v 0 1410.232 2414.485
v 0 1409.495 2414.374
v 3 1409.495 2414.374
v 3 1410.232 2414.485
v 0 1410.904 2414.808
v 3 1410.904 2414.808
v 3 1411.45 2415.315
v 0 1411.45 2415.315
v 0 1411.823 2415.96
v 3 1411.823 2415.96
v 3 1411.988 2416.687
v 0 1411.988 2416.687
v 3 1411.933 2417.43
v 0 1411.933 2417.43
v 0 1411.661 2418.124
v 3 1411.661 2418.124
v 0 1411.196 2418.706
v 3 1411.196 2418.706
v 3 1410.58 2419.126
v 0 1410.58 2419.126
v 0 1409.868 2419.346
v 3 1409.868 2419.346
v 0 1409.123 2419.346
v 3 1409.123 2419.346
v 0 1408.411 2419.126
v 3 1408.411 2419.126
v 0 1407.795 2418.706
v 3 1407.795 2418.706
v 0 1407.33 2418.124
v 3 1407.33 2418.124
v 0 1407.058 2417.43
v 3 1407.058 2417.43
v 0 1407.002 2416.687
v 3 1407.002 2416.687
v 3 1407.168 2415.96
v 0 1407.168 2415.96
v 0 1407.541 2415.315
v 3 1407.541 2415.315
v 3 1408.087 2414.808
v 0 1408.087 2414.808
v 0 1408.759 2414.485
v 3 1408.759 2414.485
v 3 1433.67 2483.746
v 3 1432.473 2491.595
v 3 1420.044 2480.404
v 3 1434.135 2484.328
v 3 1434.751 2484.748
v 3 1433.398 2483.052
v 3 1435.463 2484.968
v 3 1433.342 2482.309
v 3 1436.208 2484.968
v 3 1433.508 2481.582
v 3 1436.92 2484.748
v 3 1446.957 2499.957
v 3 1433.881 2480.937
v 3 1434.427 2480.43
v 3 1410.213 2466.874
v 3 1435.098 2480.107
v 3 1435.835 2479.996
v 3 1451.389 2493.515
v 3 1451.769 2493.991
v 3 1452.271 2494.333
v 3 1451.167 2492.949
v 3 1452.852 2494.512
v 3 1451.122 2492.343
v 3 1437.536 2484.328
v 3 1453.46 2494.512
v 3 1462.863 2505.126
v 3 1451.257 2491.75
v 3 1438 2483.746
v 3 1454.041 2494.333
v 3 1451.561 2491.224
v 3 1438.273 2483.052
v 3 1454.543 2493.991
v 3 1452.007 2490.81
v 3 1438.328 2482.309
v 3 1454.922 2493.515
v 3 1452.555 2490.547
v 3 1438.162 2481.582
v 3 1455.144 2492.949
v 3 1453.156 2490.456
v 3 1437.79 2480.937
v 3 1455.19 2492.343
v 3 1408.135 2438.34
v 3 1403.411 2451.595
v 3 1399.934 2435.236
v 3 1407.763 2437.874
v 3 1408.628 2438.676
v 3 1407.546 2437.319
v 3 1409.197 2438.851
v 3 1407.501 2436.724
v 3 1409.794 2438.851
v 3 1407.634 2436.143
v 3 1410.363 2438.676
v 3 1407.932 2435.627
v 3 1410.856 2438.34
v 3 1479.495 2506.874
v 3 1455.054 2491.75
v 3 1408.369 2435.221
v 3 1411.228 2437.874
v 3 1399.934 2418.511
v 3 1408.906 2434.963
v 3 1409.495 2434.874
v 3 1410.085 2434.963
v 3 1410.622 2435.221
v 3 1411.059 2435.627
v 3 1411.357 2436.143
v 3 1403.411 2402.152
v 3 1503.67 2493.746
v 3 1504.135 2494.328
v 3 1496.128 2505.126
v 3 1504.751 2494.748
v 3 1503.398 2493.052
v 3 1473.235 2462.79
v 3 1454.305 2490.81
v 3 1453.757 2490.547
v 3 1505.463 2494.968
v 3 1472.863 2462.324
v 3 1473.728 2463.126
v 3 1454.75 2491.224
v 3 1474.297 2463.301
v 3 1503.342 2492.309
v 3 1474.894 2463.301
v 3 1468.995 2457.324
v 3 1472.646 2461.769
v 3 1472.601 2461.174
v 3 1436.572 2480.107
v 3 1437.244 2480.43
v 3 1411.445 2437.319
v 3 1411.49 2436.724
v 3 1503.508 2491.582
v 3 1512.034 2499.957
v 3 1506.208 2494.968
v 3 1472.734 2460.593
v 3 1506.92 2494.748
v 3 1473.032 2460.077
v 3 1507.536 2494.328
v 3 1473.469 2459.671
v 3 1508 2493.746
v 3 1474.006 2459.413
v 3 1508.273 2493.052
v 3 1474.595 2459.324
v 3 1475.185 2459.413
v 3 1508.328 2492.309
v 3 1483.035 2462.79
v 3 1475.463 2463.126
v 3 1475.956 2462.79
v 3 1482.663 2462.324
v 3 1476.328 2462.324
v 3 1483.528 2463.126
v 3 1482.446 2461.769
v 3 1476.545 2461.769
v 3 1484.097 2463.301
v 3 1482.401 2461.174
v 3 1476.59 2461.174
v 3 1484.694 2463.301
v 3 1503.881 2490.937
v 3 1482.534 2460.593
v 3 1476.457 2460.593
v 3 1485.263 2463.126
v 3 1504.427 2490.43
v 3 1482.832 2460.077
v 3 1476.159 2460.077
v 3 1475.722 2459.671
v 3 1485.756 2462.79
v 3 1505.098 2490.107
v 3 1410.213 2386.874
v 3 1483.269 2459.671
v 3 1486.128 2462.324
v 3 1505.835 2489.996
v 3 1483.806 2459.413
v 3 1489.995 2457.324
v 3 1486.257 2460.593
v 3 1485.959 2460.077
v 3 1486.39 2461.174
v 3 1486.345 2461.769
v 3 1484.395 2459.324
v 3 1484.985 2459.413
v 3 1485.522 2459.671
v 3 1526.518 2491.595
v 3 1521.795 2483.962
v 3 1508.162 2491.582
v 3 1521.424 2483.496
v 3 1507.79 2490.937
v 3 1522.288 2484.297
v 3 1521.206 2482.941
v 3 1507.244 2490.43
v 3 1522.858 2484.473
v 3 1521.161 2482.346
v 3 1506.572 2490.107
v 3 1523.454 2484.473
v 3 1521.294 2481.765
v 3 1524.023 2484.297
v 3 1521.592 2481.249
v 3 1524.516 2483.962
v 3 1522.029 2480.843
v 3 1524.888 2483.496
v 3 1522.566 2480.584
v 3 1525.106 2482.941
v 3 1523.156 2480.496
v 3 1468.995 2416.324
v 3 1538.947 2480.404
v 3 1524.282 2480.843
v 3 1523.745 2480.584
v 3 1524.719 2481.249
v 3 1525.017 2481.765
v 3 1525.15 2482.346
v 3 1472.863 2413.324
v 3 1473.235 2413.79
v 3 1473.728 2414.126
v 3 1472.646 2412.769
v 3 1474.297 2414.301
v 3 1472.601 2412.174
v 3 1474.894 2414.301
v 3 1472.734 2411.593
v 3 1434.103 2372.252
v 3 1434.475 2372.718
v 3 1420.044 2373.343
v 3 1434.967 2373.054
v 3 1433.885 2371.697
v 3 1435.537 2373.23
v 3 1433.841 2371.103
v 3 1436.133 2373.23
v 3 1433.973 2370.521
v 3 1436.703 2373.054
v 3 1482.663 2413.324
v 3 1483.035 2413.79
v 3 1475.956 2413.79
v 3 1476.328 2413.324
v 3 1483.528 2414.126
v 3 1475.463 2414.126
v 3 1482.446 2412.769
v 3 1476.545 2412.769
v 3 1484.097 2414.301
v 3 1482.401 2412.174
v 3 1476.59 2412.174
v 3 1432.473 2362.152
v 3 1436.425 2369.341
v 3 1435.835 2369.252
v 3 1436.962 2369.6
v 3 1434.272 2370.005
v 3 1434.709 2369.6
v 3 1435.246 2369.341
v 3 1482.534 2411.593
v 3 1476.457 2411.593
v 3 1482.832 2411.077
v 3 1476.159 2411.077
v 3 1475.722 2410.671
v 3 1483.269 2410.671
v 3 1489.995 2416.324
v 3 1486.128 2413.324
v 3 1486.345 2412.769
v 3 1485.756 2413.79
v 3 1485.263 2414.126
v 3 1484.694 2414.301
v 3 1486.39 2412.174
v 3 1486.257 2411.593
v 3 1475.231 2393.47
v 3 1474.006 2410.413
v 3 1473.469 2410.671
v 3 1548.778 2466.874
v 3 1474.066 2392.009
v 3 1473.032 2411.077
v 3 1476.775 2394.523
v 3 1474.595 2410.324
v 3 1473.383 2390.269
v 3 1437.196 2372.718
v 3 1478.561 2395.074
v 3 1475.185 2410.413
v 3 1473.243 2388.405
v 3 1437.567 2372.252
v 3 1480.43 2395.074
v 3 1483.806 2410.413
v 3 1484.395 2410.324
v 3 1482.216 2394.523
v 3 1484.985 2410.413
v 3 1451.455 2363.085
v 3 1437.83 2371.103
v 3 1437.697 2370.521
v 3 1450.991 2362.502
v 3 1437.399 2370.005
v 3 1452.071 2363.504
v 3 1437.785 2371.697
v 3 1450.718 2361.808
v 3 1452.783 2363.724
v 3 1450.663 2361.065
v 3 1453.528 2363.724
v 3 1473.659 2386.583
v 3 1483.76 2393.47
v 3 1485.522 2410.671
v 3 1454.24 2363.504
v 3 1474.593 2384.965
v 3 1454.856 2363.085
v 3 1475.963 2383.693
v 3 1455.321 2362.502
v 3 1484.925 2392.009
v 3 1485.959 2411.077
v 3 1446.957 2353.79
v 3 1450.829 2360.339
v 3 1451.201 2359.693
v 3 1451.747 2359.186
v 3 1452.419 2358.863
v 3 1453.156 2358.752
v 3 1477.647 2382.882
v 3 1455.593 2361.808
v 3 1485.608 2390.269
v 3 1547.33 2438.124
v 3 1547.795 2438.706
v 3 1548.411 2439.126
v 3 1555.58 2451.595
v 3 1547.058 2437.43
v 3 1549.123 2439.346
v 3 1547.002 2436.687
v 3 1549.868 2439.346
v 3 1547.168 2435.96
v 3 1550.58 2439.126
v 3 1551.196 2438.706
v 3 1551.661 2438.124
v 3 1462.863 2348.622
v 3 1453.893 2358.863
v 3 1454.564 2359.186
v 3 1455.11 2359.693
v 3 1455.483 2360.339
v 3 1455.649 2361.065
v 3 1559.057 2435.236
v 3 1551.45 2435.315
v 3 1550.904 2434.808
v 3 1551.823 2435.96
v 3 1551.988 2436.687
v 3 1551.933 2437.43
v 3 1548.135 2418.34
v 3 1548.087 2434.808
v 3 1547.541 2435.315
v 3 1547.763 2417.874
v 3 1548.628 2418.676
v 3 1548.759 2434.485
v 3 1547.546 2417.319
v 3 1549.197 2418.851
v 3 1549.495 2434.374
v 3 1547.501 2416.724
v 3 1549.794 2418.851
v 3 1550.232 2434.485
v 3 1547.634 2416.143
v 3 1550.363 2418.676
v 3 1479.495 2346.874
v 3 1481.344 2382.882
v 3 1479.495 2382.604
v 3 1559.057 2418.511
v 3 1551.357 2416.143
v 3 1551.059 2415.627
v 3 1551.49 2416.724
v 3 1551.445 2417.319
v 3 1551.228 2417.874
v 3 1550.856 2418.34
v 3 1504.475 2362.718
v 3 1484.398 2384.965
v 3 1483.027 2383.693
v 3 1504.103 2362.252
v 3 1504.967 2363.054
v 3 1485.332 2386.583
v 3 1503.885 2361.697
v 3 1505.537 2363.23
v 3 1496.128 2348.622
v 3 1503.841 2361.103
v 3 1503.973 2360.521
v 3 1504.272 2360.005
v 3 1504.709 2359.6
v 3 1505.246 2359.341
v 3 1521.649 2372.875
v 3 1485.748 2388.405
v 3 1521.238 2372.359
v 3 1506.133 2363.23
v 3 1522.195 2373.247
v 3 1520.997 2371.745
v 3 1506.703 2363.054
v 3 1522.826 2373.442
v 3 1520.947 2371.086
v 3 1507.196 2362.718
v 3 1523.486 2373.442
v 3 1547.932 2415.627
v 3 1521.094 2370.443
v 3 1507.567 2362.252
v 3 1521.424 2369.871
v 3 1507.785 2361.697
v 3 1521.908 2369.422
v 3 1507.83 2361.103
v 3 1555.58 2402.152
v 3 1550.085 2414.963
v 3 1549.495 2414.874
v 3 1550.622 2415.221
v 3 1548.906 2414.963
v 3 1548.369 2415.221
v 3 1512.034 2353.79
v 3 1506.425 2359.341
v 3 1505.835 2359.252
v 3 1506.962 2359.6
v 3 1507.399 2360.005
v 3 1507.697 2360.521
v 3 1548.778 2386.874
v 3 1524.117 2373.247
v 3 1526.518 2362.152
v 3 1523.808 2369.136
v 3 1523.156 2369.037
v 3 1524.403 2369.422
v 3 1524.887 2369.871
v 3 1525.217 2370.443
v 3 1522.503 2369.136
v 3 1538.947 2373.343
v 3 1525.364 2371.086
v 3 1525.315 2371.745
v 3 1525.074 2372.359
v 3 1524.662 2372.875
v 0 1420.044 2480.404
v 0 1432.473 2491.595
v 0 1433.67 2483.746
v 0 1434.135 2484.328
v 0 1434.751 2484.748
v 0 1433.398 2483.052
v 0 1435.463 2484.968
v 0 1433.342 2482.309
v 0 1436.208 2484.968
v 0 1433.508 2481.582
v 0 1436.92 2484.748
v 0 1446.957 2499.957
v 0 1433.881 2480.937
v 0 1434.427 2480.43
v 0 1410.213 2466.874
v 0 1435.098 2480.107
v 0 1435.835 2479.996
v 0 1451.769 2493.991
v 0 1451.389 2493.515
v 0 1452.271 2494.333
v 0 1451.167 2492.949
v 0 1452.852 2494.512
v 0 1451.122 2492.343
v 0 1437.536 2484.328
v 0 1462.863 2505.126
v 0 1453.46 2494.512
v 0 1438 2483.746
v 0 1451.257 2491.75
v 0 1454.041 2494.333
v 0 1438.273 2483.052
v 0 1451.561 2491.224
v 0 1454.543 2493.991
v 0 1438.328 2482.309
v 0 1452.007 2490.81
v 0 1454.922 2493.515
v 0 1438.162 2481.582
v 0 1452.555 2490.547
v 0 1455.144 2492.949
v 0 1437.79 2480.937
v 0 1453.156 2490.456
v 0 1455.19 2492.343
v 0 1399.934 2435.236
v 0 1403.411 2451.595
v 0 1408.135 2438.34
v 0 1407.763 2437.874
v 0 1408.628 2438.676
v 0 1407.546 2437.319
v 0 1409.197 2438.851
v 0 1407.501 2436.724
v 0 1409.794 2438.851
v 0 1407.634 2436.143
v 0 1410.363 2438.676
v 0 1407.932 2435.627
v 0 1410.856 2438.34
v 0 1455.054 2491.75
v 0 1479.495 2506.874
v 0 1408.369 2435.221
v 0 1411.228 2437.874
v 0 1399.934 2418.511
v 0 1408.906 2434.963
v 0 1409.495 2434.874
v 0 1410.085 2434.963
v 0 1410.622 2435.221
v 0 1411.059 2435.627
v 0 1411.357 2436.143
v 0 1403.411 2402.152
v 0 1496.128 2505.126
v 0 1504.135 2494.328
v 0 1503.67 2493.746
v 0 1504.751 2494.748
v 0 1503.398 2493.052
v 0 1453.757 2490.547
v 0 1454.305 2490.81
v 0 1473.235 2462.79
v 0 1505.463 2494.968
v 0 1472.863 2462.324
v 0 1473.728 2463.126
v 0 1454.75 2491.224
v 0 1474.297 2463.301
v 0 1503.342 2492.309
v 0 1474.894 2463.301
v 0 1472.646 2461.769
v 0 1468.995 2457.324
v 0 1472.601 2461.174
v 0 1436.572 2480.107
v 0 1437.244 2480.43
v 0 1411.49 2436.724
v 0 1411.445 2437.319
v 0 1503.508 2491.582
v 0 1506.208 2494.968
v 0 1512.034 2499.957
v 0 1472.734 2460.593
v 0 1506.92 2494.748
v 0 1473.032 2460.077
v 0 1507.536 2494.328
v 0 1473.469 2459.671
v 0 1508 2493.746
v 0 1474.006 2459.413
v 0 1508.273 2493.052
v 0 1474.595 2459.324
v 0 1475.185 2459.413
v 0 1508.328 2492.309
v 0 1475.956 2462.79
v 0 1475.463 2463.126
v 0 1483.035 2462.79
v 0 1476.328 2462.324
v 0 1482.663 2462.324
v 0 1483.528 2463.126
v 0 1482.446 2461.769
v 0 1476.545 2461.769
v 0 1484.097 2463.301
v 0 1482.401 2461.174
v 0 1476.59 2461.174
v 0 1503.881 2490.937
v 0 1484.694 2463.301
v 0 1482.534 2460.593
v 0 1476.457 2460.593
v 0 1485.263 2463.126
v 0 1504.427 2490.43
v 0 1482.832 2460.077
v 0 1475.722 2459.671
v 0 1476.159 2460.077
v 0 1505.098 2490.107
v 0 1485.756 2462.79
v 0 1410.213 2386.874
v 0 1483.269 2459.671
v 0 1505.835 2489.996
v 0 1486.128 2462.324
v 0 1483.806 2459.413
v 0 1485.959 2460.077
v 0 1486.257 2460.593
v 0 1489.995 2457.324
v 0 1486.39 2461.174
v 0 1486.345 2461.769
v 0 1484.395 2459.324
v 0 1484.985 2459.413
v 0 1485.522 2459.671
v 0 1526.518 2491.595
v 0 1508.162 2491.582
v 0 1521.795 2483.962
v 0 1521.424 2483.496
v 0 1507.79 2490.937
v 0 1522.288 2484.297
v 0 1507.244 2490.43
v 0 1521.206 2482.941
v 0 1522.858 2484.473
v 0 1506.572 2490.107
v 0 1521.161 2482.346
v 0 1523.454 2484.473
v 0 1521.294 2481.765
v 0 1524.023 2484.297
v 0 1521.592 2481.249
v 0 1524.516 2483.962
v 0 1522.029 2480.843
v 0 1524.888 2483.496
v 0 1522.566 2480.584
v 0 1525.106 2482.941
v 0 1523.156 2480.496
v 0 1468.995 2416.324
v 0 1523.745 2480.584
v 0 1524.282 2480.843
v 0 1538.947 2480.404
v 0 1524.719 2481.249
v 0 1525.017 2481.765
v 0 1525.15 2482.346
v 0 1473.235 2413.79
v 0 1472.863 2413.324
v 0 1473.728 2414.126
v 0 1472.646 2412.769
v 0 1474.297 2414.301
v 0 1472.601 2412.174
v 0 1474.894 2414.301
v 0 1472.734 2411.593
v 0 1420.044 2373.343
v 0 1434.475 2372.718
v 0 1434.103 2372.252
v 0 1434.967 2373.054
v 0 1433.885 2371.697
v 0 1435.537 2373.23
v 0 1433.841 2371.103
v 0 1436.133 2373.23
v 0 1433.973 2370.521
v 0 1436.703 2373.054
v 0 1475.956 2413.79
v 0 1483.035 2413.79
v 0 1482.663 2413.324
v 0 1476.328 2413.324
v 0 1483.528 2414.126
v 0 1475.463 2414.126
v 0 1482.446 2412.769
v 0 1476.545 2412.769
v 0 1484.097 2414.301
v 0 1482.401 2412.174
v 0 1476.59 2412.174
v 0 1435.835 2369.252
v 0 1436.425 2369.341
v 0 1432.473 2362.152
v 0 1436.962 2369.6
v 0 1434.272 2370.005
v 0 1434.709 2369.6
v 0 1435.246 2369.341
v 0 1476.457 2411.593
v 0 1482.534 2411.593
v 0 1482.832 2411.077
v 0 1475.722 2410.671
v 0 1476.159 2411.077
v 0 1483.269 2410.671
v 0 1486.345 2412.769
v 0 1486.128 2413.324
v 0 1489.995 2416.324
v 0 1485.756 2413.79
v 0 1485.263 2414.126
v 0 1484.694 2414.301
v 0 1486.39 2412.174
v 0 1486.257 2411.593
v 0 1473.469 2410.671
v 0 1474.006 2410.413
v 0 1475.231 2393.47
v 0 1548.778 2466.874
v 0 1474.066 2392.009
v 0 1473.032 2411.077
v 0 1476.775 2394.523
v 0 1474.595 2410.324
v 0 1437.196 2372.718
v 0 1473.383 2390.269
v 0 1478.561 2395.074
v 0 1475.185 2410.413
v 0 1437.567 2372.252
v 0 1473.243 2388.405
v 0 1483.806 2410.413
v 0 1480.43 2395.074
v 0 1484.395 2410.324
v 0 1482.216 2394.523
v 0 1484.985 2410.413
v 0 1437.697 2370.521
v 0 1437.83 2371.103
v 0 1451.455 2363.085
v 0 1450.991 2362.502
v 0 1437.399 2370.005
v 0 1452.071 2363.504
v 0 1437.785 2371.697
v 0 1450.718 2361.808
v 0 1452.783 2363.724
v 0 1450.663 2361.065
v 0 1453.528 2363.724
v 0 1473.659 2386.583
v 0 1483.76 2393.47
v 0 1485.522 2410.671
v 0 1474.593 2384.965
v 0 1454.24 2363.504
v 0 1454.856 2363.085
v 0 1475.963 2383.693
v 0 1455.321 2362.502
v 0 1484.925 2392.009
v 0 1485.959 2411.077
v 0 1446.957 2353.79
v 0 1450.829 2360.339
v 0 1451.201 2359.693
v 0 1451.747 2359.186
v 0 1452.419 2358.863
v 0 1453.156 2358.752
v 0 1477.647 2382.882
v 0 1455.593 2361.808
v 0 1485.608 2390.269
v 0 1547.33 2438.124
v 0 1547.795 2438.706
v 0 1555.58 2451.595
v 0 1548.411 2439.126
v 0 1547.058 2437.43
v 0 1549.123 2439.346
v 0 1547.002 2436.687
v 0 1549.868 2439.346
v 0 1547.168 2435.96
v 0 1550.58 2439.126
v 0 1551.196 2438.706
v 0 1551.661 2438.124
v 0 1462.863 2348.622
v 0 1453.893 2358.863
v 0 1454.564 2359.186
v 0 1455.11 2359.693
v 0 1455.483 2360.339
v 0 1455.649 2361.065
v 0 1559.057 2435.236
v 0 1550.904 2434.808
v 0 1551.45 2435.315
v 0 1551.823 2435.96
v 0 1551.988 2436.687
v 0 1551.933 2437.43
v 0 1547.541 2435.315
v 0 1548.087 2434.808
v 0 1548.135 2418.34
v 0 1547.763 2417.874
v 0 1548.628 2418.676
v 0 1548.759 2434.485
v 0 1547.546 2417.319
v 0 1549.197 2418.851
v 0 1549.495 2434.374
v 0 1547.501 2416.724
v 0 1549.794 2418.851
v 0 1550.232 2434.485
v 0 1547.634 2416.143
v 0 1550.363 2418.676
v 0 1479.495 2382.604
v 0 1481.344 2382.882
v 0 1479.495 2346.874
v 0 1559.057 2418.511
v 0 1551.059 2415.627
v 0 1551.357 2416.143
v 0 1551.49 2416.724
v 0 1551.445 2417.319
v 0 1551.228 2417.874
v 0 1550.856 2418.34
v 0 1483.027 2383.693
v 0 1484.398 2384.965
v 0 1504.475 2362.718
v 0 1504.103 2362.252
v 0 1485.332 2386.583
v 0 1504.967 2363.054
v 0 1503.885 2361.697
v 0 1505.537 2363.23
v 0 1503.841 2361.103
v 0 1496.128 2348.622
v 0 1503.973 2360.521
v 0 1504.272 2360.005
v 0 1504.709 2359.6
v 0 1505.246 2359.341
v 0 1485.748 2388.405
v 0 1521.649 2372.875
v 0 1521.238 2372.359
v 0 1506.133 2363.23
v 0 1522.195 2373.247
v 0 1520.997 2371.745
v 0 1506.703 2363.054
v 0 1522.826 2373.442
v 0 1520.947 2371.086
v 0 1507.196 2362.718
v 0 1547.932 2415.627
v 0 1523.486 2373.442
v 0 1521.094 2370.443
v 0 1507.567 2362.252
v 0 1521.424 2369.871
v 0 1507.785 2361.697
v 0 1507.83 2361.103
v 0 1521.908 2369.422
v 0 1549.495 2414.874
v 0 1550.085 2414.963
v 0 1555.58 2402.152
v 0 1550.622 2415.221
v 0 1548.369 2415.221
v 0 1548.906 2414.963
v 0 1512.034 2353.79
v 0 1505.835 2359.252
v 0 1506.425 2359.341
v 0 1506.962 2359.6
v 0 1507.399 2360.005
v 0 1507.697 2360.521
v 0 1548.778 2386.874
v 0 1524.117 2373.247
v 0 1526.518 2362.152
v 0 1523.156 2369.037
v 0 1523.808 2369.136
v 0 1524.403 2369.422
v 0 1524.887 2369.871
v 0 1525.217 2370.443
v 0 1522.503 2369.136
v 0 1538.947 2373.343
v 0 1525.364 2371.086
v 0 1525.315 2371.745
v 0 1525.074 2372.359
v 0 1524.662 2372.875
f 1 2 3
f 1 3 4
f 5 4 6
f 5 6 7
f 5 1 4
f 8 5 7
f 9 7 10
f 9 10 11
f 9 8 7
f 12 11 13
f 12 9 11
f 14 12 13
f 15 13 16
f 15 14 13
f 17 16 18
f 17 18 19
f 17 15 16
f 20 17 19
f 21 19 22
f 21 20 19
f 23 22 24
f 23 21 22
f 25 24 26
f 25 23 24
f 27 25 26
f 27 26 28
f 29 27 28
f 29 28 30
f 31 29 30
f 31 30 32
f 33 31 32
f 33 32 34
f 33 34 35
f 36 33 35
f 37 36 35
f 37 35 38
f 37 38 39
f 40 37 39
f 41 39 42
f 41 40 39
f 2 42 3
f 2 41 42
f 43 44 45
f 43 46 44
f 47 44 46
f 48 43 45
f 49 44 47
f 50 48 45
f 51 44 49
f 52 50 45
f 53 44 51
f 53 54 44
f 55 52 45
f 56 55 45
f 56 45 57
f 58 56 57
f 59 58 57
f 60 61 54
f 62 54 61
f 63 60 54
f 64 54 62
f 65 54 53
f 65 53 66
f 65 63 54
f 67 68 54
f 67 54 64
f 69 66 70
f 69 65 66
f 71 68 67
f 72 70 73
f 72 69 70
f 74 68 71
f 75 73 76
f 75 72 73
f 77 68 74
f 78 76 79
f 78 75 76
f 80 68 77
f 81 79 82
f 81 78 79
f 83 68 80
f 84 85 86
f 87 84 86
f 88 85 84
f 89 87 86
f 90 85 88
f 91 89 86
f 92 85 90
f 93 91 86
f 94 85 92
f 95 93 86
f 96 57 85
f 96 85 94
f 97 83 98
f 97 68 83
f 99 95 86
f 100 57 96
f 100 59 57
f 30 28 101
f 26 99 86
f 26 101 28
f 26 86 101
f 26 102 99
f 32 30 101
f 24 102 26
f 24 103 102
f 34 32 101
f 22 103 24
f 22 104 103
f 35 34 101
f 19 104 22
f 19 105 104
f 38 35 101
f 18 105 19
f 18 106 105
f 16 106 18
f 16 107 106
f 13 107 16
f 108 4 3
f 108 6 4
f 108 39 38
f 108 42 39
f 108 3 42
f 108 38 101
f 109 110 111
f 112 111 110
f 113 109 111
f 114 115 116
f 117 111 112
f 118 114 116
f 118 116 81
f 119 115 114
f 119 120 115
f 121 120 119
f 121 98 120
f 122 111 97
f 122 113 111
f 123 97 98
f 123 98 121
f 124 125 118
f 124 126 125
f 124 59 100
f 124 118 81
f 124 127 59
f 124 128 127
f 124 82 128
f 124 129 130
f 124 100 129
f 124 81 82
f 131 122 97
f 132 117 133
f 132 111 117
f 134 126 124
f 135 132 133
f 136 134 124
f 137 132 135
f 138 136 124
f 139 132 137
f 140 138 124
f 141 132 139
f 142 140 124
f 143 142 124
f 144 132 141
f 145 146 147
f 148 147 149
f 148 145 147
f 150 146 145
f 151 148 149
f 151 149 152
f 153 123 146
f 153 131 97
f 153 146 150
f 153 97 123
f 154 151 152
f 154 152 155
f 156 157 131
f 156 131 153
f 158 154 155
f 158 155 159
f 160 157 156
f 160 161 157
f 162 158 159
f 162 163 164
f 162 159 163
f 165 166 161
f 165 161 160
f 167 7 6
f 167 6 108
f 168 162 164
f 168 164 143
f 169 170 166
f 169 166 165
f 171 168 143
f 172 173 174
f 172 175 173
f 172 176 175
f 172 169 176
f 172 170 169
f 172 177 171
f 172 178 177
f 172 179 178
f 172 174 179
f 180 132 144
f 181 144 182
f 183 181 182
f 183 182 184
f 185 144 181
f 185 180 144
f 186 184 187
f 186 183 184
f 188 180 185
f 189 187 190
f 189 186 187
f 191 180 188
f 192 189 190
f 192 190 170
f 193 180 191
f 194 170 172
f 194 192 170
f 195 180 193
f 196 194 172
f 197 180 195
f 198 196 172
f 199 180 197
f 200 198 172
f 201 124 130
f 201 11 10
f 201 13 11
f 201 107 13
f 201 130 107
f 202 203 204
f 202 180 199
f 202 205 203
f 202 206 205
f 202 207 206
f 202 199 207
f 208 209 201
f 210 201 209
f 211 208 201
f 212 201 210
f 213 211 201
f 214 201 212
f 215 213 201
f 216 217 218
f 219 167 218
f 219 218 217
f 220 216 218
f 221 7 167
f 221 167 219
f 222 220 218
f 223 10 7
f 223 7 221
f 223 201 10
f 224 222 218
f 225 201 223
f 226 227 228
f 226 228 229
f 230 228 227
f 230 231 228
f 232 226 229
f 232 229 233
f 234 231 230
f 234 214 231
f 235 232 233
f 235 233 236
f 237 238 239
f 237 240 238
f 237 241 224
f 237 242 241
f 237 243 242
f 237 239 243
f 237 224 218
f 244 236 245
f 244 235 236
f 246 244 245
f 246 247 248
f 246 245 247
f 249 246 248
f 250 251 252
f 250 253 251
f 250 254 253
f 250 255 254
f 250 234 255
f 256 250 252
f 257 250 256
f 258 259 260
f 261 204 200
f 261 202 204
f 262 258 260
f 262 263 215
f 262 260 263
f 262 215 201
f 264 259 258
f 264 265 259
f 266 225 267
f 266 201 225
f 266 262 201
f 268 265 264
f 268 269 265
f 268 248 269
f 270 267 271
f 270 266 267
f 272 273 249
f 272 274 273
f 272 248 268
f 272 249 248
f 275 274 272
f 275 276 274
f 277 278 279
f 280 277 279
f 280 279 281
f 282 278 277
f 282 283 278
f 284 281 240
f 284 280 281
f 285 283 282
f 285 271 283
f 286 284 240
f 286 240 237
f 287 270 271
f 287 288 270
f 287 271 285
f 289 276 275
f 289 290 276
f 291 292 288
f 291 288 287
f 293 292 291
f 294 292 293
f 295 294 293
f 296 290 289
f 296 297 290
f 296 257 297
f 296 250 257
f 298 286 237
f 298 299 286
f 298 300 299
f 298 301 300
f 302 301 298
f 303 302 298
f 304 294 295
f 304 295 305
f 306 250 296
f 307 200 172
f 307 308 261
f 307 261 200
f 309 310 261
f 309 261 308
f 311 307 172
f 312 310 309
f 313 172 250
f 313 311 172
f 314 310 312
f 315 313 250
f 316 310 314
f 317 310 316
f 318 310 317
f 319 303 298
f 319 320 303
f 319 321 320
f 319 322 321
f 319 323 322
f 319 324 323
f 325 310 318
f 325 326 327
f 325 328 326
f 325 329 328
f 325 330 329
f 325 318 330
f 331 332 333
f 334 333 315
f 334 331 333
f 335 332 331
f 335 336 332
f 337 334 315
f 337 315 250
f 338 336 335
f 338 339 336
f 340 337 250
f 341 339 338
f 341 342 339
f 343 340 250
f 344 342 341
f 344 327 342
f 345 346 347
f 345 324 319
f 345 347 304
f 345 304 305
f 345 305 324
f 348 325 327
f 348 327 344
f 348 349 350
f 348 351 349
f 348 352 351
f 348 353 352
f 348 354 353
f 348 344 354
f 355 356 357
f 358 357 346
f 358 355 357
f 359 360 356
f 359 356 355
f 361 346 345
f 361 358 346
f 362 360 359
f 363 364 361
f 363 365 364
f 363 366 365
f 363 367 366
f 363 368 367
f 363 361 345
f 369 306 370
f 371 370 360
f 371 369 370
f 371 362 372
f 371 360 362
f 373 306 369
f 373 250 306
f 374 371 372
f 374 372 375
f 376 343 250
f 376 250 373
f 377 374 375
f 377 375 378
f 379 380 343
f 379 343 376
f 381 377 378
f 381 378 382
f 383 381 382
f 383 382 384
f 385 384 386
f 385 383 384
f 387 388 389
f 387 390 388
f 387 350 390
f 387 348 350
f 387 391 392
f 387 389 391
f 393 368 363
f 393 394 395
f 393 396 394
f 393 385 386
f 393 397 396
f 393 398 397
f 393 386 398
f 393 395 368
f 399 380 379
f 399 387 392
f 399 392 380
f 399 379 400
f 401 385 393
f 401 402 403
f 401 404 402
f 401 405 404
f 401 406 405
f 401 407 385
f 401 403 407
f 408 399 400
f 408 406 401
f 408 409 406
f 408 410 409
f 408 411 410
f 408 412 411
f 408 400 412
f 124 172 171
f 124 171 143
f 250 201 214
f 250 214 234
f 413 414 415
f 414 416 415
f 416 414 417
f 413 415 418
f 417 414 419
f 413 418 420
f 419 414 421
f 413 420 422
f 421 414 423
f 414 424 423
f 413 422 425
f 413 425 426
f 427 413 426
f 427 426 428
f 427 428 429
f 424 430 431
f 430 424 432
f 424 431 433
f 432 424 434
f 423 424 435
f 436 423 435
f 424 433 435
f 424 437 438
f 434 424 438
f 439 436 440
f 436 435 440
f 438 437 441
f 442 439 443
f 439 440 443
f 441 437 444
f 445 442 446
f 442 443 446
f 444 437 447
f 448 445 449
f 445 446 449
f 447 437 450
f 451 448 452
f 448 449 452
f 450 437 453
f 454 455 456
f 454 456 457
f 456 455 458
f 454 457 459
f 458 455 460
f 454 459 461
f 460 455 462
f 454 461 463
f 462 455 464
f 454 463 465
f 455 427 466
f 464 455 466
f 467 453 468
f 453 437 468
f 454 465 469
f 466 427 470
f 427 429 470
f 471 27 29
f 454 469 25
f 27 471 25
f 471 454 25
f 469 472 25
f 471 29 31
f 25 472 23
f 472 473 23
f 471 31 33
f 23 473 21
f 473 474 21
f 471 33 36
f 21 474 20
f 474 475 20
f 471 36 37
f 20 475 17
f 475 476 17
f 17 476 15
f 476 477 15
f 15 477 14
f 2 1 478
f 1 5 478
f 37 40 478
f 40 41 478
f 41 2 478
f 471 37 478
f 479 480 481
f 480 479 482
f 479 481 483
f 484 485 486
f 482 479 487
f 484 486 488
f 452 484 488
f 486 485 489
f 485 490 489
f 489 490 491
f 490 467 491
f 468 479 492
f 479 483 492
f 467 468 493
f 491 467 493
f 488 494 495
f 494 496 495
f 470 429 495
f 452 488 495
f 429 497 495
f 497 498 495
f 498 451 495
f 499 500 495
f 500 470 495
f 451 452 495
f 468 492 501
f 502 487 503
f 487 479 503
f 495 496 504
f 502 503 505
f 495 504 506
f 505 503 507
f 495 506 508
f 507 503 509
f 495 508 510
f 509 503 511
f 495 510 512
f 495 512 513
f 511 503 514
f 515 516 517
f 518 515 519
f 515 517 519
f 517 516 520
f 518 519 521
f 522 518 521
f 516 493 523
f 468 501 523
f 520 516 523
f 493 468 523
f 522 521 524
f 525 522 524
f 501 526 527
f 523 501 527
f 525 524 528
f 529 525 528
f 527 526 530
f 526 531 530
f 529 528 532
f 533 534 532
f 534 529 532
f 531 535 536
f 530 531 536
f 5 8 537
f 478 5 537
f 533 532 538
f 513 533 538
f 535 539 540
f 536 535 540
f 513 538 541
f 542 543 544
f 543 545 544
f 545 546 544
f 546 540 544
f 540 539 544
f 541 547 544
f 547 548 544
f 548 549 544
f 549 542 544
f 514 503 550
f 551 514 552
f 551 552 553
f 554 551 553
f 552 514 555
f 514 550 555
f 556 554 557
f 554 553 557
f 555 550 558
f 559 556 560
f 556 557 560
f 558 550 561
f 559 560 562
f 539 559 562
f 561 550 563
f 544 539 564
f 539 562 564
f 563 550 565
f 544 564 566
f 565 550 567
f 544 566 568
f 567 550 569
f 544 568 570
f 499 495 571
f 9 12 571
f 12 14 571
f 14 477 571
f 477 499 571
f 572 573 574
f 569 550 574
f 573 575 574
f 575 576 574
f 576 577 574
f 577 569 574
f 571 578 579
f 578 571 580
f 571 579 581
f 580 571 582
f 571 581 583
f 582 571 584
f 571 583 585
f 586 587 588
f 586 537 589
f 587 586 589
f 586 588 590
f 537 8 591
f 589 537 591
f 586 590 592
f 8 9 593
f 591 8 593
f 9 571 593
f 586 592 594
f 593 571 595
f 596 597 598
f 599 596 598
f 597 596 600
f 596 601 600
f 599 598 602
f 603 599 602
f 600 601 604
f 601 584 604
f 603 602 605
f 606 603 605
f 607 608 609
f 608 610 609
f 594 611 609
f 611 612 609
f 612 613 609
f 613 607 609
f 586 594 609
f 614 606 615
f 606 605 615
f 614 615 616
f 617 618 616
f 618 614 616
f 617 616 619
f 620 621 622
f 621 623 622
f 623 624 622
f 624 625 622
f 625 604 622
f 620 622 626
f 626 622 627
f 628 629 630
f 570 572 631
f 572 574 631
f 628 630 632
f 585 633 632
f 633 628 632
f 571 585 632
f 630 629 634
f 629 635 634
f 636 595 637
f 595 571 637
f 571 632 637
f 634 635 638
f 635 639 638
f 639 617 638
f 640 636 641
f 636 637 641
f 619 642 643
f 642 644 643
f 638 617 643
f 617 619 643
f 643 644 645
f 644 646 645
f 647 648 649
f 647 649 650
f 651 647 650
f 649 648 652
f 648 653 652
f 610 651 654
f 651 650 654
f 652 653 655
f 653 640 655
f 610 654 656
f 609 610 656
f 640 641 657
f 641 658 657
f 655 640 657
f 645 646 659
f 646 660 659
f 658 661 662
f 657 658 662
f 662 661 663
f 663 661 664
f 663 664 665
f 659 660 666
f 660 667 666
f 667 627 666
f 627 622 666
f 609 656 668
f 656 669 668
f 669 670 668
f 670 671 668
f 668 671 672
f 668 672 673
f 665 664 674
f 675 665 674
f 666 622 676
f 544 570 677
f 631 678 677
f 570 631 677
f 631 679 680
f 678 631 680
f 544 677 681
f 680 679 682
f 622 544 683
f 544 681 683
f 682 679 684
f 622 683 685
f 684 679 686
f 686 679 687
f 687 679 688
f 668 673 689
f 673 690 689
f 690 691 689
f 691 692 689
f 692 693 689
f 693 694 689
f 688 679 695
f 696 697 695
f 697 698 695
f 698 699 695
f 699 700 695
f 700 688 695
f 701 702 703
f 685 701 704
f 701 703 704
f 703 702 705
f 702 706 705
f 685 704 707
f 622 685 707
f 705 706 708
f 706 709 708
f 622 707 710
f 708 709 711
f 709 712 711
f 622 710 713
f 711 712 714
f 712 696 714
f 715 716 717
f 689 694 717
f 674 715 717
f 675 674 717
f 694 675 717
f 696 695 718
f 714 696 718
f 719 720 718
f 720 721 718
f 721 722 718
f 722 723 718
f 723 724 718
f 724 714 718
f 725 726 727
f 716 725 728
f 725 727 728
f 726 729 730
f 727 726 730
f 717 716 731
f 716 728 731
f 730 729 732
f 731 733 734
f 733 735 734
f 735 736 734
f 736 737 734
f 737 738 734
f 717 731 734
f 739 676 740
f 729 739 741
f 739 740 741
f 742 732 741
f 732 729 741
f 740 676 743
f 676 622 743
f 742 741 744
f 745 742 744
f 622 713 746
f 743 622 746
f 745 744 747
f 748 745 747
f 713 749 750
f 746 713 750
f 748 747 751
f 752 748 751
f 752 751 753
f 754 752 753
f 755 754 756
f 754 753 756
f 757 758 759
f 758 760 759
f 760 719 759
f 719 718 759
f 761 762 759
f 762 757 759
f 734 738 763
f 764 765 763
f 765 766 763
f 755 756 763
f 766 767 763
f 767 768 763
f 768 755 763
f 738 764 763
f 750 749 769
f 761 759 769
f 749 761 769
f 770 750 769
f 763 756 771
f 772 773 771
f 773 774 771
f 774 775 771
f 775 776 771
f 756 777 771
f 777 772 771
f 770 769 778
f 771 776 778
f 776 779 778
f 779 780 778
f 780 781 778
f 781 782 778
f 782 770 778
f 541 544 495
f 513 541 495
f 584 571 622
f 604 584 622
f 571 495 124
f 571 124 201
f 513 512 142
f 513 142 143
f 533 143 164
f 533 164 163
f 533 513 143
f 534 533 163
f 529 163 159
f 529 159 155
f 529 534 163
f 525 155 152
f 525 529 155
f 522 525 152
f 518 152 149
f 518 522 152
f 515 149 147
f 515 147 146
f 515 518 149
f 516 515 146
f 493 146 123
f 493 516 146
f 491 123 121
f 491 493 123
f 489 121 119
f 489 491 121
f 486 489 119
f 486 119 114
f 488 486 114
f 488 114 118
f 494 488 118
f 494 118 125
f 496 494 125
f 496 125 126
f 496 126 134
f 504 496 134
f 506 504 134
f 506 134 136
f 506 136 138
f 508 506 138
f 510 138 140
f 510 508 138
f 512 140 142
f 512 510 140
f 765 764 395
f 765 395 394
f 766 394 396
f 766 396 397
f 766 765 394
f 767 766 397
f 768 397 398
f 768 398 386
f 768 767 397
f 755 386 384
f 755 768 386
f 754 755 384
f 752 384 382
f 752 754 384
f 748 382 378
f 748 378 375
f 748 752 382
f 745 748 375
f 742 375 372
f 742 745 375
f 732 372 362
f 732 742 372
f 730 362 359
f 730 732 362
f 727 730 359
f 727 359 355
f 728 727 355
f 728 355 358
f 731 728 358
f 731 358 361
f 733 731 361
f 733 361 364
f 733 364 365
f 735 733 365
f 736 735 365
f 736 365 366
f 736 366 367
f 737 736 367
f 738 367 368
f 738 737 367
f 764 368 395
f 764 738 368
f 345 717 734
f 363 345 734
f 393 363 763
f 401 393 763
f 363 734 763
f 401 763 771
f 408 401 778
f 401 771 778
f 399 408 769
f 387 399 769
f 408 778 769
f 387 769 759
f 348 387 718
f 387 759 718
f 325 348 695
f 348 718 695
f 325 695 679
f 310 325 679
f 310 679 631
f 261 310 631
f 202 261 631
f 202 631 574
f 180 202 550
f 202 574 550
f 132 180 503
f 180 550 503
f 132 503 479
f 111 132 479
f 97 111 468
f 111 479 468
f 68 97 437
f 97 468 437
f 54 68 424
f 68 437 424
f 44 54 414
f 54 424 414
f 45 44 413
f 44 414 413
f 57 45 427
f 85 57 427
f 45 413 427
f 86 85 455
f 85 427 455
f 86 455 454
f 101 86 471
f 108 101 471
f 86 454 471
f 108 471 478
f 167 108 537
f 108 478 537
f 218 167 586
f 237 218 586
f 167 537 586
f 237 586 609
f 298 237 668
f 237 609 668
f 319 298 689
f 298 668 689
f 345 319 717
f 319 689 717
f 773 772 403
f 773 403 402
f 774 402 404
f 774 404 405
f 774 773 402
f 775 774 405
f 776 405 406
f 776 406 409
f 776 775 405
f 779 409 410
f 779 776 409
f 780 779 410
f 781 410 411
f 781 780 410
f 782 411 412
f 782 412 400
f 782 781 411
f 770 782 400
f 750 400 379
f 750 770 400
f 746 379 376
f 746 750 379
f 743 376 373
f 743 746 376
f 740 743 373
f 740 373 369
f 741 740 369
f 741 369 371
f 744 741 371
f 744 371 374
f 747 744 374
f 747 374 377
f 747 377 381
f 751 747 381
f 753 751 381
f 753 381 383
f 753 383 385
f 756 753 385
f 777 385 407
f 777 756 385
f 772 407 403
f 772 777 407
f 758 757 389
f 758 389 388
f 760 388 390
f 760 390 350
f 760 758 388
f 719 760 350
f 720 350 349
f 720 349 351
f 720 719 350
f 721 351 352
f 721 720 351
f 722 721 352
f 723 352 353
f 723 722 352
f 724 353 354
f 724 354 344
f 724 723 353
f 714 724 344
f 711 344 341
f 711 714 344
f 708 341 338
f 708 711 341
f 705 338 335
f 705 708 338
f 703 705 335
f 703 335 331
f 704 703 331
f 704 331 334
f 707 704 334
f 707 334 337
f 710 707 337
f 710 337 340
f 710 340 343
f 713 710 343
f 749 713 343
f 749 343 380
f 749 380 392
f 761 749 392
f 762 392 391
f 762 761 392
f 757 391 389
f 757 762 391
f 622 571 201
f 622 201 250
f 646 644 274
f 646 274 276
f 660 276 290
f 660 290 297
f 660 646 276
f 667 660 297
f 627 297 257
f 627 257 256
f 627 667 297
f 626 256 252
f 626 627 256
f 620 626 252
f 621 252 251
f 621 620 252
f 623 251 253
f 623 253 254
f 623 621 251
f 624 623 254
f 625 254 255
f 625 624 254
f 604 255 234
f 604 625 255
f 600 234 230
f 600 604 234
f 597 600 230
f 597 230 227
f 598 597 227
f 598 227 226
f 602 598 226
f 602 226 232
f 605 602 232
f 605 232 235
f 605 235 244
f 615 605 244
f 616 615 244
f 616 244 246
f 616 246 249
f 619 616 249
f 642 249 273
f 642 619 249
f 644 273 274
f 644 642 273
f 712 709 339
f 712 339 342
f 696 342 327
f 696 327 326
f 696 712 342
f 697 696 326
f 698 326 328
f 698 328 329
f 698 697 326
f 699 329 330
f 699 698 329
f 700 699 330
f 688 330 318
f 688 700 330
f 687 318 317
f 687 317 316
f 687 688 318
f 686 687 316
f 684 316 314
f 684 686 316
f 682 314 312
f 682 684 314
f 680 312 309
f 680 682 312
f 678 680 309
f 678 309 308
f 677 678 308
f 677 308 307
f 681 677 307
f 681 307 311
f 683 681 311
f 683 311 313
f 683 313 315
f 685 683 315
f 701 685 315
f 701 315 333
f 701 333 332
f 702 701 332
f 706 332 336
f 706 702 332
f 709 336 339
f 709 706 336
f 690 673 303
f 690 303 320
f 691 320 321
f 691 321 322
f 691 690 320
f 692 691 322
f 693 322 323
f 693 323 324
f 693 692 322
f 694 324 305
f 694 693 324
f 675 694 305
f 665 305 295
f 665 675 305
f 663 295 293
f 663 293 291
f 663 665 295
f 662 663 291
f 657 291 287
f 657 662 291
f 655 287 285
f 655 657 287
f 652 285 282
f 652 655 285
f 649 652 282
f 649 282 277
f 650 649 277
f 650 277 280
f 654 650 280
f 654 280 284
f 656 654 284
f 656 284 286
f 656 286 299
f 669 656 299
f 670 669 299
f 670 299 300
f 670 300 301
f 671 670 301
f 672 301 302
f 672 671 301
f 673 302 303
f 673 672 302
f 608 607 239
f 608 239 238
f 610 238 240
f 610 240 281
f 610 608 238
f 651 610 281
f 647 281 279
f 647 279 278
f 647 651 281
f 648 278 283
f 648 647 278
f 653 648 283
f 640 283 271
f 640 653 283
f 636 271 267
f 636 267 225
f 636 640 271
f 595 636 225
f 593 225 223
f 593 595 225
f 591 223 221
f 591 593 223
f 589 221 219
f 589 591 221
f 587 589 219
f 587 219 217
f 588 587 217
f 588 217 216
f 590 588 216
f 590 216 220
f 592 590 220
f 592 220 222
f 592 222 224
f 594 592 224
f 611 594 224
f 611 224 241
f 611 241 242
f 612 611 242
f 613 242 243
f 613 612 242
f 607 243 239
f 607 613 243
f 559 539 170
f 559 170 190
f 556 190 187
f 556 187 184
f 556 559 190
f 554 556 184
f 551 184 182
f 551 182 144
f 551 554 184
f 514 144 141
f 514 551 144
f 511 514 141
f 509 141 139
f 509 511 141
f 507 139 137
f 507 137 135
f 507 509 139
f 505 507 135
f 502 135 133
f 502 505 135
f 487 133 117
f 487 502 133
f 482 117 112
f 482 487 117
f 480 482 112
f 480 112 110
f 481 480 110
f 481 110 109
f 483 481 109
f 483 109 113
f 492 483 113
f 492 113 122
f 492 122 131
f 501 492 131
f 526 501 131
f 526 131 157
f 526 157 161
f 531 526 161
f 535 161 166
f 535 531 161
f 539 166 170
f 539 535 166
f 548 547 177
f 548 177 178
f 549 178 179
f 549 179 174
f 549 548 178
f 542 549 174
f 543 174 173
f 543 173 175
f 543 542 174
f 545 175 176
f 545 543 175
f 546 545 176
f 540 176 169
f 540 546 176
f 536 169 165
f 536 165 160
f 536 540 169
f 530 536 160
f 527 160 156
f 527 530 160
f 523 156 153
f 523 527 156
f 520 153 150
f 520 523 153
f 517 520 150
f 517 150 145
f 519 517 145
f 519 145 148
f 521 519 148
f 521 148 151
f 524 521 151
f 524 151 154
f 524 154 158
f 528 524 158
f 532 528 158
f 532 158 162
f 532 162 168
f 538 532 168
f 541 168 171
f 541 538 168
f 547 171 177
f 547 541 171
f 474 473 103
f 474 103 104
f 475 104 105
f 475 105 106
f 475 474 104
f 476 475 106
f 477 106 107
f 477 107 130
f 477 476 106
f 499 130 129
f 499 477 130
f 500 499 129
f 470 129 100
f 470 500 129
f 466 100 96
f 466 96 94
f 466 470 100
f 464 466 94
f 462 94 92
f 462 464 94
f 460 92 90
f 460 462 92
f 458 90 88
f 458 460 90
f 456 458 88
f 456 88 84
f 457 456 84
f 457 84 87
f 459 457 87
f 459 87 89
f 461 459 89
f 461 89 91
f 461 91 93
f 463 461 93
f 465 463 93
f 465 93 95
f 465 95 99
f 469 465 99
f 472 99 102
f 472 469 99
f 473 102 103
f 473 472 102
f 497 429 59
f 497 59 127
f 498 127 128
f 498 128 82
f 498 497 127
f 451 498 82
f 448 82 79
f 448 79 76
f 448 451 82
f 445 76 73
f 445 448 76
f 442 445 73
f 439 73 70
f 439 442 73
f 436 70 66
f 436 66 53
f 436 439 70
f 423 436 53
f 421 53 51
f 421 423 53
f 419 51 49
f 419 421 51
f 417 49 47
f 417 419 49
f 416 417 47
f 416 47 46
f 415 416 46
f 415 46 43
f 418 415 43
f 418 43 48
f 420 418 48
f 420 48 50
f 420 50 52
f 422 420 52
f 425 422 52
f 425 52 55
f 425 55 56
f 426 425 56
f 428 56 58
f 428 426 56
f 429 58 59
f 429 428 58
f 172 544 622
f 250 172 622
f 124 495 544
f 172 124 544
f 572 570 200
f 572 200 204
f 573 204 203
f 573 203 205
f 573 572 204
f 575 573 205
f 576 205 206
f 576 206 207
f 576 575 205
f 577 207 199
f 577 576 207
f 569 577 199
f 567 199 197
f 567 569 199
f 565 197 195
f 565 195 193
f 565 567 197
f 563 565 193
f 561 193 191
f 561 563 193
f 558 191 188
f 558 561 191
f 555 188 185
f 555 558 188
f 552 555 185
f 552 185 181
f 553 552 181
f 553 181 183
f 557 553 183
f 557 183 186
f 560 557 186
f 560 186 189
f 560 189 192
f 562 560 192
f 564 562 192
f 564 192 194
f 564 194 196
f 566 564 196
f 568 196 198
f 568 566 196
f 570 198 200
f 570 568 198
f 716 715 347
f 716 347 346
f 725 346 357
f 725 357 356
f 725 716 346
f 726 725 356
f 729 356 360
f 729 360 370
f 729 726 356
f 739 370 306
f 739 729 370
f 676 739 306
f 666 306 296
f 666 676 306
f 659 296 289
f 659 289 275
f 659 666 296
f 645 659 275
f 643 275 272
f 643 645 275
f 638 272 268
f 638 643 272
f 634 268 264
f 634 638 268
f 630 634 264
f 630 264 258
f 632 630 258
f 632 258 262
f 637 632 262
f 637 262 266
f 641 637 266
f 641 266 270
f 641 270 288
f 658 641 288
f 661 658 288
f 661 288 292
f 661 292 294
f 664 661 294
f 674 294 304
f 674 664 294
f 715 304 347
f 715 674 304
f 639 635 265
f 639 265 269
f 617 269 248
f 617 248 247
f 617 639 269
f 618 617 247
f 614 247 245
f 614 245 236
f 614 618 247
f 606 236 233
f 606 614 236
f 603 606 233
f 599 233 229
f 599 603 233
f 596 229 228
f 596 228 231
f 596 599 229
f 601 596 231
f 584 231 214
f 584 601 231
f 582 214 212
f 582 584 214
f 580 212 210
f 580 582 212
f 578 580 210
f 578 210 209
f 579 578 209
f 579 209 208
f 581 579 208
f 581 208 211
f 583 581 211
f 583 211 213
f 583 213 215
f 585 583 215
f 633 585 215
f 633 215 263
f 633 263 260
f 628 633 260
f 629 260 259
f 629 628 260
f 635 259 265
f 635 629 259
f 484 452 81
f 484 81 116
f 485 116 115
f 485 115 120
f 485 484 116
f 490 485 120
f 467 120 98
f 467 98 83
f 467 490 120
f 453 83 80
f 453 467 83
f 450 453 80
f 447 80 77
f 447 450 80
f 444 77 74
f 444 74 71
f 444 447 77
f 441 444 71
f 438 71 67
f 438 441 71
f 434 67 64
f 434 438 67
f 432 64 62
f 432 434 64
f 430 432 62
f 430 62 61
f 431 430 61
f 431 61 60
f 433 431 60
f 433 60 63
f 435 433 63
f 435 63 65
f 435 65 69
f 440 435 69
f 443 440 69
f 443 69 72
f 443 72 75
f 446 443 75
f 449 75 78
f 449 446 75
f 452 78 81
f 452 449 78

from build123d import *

# Parameters (mm, degrees)
SKETCH_1_R      = 80
SKETCH_1_R_2    = 6.269952148
SKETCH_1_R_3    = 2
SKETCH_1_R_4    = 2.5
SKETCH_1_R_5    = 2.214537903
SKETCH_1_R_6    = 2.039490197
SKETCH_1_W      = 41
SKETCH_1_H      = 21
EXTRUDE_1_DEPTH = 3


with BuildPart() as part:
    # ｽｹｯﾁ1 → ﾎﾞｽ - 押し出し1 (new body)
    with BuildSketch(Plane(origin=(0, 0, 0), x_dir=(0, 0, -1), z_dir=(1, 0, 0))):
        with Locations((-2426.873769578, 1479.495473195)):
            Circle(SKETCH_1_R)
        with Locations((-2388.873769578, 1479.495473195)):
            Circle(SKETCH_1_R_2, mode=Mode.SUBTRACT)
        with Locations((-2412.323769578, 1484.395473195)):
            Circle(SKETCH_1_R_3, mode=Mode.SUBTRACT)
        with Locations((-2412.323769578, 1474.595473195)):
            Circle(SKETCH_1_R_3, mode=Mode.SUBTRACT)
        with Locations((-2461.323769578, 1484.395473195)):
            Circle(SKETCH_1_R_3, mode=Mode.SUBTRACT)
        with Locations((-2461.323769578, 1474.595473195)):
            Circle(SKETCH_1_R_3, mode=Mode.SUBTRACT)
        with Locations((-2492.495547842, 1505.835219157)):
            Circle(SKETCH_1_R_4, mode=Mode.SUBTRACT)
        with Locations((-2482.495547842, 1523.155727232)):
            Circle(SKETCH_1_R_3, mode=Mode.SUBTRACT)
        with Locations((-2436.873769578, 1549.495473195)):
            Circle(SKETCH_1_R_4, mode=Mode.SUBTRACT)
        with Locations((-2416.873769578, 1549.495473195)):
            Circle(SKETCH_1_R_3, mode=Mode.SUBTRACT)
        with Locations((-2371.251991313, 1523.155727232)):
            Circle(SKETCH_1_R_5, mode=Mode.SUBTRACT)
        with Locations((-2361.251991313, 1505.835219157)):
            Circle(SKETCH_1_R_3, mode=Mode.SUBTRACT)
        with Locations((-2361.251991313, 1453.155727232)):
            Circle(SKETCH_1_R_4, mode=Mode.SUBTRACT)
        with Locations((-2371.251991313, 1435.835219157)):
            Circle(SKETCH_1_R_3, mode=Mode.SUBTRACT)
        with Locations((-2416.873769578, 1409.495473195)):
            Circle(SKETCH_1_R_4, mode=Mode.SUBTRACT)
        with Locations((-2436.873769578, 1409.495473195)):
            Circle(SKETCH_1_R_3, mode=Mode.SUBTRACT)
        with Locations((-2482.495547842, 1435.835219157)):
            Circle(SKETCH_1_R_4, mode=Mode.SUBTRACT)
        with Locations((-2492.495547842, 1453.155727232)):
            Circle(SKETCH_1_R_6, mode=Mode.SUBTRACT)
        with Locations((-2436.823769578, 1479.495473195)):
            Rectangle(SKETCH_1_W, SKETCH_1_H, mode=Mode.SUBTRACT)
    extrude(amount=EXTRUDE_1_DEPTH)


solid = part.part
